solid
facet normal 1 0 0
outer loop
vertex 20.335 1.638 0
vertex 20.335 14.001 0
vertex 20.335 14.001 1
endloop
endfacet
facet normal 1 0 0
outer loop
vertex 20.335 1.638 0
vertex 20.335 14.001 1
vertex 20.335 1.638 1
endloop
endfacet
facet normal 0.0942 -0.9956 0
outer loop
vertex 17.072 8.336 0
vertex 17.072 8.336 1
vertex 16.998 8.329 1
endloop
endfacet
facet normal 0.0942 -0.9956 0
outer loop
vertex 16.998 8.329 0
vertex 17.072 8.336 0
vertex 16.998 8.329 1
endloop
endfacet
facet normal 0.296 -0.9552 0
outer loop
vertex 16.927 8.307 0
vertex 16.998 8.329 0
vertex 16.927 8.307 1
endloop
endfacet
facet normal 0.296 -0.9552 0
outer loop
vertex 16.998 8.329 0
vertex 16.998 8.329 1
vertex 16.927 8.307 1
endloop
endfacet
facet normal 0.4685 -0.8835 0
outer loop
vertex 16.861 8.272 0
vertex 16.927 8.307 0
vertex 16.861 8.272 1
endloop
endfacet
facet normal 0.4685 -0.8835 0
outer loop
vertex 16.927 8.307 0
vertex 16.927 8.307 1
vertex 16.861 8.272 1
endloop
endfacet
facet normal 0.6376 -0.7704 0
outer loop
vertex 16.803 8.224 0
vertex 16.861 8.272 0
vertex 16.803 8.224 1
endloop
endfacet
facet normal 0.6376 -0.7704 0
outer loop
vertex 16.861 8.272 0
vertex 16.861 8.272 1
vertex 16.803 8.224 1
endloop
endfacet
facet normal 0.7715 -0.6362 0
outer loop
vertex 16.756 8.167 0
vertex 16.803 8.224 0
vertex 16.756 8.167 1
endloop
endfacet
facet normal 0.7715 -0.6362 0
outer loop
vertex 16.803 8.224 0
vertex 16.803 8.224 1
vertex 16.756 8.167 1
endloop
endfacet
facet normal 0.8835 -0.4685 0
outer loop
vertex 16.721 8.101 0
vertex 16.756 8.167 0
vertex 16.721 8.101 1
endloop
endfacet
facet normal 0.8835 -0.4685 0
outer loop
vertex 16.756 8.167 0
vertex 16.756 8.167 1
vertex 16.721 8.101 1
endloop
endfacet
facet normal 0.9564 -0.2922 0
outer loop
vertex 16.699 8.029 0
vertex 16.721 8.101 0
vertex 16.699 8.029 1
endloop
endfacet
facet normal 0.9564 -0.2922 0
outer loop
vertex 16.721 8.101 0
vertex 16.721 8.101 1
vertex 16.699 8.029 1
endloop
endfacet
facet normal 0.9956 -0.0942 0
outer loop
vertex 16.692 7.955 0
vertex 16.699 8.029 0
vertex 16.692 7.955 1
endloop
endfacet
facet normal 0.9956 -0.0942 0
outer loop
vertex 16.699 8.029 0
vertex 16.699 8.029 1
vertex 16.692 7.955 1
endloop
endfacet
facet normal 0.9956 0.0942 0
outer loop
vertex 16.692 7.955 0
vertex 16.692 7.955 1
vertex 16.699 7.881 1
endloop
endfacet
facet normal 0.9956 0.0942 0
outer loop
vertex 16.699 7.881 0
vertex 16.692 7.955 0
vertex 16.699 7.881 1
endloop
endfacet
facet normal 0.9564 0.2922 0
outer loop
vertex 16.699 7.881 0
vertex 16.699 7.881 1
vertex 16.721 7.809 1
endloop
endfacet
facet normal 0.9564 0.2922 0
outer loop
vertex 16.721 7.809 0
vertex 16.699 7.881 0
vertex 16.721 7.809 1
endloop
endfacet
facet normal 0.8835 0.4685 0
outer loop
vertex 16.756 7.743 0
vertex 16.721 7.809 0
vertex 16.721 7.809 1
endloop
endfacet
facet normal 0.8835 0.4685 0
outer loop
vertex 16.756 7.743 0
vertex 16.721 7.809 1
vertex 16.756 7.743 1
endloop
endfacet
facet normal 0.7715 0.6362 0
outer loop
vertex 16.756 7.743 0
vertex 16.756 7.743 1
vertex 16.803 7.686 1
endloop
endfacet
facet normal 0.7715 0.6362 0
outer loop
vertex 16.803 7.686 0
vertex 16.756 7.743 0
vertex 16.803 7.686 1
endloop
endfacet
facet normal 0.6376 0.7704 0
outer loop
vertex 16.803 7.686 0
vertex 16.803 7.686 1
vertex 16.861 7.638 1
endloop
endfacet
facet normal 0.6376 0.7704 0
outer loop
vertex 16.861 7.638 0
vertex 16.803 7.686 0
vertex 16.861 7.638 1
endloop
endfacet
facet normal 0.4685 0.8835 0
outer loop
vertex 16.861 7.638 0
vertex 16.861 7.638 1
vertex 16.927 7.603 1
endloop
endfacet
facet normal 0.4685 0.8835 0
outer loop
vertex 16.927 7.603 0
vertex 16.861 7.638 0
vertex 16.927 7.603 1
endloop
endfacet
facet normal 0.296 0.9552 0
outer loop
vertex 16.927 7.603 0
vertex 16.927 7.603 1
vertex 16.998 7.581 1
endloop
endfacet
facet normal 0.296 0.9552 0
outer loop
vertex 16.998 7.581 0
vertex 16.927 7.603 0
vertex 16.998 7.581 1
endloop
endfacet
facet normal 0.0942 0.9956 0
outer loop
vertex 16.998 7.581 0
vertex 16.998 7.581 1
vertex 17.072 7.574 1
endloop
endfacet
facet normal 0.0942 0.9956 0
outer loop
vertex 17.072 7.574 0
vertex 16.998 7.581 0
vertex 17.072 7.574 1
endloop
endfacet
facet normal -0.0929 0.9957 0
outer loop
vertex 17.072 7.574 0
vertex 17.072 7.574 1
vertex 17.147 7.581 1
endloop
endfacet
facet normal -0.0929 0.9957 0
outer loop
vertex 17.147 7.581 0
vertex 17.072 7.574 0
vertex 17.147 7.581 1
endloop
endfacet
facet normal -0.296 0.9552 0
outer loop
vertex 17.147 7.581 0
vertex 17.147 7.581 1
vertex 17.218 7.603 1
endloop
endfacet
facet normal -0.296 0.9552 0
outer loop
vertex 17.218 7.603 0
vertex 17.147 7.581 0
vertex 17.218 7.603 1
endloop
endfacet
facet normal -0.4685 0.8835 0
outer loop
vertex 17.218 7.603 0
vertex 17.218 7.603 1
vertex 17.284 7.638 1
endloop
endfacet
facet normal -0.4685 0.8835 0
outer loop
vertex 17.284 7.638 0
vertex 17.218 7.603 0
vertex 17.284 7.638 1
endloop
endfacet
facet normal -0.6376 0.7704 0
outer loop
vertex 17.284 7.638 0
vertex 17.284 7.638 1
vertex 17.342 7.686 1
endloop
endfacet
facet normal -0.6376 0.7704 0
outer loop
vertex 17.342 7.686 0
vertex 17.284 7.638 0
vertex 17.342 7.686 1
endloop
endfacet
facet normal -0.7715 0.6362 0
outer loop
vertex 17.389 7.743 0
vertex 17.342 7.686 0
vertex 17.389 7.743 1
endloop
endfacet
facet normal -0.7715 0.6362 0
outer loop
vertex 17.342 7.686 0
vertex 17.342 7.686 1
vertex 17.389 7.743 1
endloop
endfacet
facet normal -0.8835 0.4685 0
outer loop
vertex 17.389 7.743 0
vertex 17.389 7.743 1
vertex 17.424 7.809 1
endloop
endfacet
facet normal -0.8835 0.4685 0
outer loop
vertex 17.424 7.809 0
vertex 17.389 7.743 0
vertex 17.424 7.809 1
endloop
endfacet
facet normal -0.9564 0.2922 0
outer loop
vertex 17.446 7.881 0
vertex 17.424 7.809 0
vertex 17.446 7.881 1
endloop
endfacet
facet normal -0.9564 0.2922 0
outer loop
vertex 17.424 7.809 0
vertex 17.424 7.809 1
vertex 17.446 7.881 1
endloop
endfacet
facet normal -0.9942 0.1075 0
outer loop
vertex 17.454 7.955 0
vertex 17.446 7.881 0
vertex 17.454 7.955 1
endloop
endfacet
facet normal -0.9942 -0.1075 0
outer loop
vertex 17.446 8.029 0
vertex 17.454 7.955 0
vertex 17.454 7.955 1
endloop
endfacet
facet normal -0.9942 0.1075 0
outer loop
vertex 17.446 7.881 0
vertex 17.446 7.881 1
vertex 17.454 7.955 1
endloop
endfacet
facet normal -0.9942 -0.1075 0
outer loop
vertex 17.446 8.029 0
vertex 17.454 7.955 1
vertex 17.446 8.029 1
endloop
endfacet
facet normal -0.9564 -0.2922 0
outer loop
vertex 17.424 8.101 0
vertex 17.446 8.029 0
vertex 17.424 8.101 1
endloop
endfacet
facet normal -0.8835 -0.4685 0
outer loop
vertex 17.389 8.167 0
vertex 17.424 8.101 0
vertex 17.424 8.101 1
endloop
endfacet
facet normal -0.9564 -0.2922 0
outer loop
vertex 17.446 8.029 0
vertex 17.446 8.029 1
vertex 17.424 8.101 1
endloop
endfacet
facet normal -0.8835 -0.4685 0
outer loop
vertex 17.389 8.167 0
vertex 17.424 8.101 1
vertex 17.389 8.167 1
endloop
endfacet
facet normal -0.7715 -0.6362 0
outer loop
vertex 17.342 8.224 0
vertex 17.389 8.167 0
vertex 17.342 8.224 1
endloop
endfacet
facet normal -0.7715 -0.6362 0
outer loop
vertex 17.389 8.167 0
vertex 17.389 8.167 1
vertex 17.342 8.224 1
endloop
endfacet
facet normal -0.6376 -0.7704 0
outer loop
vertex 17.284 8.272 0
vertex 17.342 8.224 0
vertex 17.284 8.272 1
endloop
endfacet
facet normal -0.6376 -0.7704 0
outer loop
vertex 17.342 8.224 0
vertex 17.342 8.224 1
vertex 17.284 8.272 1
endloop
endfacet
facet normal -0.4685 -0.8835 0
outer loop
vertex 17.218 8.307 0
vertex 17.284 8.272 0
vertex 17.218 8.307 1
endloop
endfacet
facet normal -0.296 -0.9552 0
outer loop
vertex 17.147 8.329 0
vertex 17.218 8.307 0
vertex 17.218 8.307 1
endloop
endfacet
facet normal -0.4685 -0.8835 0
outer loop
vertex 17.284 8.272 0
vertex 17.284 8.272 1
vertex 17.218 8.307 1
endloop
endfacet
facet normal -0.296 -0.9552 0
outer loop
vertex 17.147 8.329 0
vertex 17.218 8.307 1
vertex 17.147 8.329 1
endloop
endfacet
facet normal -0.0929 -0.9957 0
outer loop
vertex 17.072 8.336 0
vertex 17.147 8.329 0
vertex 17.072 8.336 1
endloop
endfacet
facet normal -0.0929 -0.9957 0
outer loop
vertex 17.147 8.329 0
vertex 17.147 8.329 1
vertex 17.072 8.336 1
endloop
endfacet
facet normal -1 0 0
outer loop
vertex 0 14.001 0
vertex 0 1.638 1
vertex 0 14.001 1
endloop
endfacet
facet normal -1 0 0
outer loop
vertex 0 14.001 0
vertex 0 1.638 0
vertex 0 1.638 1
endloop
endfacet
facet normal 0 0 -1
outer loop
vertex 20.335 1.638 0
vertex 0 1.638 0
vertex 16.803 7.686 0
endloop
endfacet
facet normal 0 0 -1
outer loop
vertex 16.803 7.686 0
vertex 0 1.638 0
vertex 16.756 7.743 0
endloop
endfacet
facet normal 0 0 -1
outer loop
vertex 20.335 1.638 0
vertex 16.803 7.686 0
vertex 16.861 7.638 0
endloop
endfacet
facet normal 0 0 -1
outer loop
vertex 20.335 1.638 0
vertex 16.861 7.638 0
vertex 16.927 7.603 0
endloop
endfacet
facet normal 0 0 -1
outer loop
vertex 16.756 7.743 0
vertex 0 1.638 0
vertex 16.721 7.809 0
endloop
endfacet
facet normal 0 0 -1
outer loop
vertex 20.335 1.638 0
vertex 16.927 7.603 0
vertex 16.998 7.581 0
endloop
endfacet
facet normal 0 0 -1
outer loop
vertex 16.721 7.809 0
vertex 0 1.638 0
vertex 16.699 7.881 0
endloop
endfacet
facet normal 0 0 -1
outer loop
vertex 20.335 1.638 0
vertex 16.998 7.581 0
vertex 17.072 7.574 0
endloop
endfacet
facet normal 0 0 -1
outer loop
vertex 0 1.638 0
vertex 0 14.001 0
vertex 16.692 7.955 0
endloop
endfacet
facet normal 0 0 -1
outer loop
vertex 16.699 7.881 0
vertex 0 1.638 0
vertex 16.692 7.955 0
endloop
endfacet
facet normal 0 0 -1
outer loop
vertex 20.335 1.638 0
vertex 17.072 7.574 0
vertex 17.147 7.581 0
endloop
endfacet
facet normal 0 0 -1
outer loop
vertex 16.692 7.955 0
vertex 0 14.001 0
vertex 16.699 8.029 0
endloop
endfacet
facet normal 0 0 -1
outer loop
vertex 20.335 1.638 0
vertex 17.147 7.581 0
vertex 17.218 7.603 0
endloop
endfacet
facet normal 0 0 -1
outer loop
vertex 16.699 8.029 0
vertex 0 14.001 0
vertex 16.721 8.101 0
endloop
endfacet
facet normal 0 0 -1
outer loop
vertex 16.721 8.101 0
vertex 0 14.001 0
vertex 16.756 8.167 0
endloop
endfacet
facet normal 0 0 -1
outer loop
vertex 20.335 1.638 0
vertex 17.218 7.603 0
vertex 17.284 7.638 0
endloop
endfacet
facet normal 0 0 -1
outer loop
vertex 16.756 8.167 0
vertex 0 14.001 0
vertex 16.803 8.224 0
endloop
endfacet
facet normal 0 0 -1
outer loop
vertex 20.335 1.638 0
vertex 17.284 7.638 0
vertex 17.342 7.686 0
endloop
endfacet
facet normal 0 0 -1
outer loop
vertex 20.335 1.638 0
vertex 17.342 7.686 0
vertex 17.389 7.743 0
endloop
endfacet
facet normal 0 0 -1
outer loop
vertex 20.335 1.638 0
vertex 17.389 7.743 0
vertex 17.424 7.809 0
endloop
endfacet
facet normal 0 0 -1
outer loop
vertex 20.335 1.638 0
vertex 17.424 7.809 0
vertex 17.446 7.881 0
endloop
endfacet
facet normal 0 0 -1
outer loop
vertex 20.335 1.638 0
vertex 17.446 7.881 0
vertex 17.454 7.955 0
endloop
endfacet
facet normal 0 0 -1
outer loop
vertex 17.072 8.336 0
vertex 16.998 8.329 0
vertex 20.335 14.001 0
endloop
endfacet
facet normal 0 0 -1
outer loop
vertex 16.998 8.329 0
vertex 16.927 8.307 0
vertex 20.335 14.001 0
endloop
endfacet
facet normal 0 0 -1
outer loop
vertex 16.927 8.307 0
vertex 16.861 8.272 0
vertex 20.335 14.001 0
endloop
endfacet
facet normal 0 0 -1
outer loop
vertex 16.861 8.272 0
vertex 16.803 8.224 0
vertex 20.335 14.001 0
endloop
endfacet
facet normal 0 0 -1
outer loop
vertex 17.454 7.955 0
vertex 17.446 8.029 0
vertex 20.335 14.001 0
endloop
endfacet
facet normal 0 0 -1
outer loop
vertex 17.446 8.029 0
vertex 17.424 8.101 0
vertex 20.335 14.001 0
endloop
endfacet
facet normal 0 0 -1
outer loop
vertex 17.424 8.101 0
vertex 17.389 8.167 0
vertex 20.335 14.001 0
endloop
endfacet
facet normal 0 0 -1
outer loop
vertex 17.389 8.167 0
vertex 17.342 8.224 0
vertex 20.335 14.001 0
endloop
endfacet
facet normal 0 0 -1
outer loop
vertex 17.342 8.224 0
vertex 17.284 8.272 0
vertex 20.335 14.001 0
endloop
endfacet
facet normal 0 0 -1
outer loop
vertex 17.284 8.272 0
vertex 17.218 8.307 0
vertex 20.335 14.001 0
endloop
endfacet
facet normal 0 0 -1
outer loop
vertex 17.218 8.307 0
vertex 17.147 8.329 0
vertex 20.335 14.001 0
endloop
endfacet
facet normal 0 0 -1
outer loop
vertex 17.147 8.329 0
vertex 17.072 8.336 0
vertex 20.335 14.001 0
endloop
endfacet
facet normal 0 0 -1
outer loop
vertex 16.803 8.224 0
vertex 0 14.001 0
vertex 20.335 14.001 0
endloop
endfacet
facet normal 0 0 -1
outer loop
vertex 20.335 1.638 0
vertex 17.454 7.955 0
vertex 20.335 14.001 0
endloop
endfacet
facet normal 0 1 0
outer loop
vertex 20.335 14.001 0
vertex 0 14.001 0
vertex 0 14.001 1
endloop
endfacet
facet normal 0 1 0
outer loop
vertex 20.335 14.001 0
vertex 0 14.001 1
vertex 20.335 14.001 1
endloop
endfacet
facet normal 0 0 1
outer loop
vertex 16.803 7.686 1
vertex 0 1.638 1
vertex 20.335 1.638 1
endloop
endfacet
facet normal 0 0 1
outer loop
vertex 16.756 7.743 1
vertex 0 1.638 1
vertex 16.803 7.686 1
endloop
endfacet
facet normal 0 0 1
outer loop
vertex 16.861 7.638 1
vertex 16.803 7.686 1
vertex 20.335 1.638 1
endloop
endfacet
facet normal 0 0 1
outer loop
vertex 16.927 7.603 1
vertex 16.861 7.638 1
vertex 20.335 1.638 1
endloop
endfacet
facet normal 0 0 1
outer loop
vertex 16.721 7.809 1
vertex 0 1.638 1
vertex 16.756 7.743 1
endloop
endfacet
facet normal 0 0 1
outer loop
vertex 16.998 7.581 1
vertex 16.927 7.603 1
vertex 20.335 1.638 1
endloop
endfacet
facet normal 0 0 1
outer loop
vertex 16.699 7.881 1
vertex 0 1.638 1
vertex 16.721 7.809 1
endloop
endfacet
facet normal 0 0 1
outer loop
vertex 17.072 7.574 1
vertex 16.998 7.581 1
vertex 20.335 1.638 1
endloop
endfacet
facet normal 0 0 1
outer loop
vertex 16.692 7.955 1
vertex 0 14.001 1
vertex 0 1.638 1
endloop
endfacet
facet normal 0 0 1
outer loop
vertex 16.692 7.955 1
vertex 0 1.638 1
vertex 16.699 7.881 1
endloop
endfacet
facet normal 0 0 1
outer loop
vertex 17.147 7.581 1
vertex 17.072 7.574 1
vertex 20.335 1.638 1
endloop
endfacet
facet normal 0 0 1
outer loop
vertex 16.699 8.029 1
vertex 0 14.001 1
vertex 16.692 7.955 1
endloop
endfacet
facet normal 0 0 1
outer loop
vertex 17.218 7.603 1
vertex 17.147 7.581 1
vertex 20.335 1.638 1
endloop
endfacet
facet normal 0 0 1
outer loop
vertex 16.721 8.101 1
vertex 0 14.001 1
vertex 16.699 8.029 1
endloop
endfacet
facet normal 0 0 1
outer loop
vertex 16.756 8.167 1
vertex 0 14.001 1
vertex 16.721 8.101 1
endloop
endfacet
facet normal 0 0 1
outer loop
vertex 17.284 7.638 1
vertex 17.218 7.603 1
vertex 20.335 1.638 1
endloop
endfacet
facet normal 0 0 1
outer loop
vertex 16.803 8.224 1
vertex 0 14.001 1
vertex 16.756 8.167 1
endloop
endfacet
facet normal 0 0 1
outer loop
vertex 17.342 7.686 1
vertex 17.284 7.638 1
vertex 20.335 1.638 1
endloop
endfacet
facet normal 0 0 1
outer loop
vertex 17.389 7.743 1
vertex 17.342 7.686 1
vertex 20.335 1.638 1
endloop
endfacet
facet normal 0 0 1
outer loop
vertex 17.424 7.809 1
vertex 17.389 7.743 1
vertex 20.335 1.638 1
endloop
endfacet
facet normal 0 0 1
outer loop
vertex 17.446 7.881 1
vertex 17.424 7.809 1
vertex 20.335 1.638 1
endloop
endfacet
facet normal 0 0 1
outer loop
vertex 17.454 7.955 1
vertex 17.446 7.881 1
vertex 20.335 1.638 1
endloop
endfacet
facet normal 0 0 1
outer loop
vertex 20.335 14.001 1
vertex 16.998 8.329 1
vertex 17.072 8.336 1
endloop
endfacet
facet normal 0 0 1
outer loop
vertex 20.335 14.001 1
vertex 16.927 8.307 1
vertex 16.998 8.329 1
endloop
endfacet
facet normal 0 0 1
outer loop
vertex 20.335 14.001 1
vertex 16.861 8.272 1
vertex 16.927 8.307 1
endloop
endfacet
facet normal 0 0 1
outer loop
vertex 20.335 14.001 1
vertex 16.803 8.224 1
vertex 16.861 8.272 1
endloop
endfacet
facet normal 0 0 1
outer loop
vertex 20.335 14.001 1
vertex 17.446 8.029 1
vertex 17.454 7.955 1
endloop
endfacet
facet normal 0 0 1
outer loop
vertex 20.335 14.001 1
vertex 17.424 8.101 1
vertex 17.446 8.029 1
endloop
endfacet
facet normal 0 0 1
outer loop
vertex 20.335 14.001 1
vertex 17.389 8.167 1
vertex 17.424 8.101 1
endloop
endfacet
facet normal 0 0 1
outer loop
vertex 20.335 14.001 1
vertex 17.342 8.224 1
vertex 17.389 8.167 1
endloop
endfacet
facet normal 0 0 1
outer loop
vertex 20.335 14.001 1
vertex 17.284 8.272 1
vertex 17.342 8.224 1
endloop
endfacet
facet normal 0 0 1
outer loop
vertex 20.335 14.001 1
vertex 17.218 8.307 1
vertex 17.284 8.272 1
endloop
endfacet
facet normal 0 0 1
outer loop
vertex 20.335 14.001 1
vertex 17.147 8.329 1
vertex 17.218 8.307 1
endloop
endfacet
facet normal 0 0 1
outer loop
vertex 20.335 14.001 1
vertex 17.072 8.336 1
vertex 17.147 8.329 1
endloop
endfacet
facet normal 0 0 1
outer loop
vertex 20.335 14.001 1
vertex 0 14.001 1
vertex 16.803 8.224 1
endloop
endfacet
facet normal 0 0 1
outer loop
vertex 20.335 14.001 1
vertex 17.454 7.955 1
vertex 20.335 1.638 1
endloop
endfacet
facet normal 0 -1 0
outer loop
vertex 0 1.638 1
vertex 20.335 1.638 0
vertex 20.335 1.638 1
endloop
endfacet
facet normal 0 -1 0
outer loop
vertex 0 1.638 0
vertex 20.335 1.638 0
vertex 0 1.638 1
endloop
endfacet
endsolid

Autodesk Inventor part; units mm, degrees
ref_plane "YZ Plane" through (0, 0, 0) normal (1, 0, 0) x (0, 1, 0)
ref_plane "XZ Plane" through (0, 0, 0) normal (0, 1, 0) x (-1, 0, 0)
ref_plane "XY Plane" through (0, 0, 0) normal (0, 0, 1) x (1, 0, 0)
sketch "Sketch1" plane through (0, 0, 0) normal (0, 0, 1) x (1, 0, 0)
  line L0 (0, 14.001) -> (20.3353, 14.001)
  line L1 (20.3353, 14.001) -> (20.3353, 1.6382)
  line L2 (20.3353, 1.6382) -> (0, 1.6382)
  line L3 (0, 1.6382) -> (0, 14.001)
  point P0 (0, 0)
extrude "Extrusion1" add sketch "Sketch1" along normal blind 1
sketch "Sketch2" plane through (0, 0, 0) normal (0, 0, -1) x (-1, 0, 0)
  point P0 (0, 0)
sketch "Sketch3" plane through (0, 0, 0) normal (0, 0, -1) x (-1, 0, 0)
  point P0 (0, 0)
  point P1 (-17.0725, 7.955)
hole "Hole1" at (17.0725, 7.955, 0) direction (0, 0, 1) diameter 0.762 end through all
properties part number "1"
